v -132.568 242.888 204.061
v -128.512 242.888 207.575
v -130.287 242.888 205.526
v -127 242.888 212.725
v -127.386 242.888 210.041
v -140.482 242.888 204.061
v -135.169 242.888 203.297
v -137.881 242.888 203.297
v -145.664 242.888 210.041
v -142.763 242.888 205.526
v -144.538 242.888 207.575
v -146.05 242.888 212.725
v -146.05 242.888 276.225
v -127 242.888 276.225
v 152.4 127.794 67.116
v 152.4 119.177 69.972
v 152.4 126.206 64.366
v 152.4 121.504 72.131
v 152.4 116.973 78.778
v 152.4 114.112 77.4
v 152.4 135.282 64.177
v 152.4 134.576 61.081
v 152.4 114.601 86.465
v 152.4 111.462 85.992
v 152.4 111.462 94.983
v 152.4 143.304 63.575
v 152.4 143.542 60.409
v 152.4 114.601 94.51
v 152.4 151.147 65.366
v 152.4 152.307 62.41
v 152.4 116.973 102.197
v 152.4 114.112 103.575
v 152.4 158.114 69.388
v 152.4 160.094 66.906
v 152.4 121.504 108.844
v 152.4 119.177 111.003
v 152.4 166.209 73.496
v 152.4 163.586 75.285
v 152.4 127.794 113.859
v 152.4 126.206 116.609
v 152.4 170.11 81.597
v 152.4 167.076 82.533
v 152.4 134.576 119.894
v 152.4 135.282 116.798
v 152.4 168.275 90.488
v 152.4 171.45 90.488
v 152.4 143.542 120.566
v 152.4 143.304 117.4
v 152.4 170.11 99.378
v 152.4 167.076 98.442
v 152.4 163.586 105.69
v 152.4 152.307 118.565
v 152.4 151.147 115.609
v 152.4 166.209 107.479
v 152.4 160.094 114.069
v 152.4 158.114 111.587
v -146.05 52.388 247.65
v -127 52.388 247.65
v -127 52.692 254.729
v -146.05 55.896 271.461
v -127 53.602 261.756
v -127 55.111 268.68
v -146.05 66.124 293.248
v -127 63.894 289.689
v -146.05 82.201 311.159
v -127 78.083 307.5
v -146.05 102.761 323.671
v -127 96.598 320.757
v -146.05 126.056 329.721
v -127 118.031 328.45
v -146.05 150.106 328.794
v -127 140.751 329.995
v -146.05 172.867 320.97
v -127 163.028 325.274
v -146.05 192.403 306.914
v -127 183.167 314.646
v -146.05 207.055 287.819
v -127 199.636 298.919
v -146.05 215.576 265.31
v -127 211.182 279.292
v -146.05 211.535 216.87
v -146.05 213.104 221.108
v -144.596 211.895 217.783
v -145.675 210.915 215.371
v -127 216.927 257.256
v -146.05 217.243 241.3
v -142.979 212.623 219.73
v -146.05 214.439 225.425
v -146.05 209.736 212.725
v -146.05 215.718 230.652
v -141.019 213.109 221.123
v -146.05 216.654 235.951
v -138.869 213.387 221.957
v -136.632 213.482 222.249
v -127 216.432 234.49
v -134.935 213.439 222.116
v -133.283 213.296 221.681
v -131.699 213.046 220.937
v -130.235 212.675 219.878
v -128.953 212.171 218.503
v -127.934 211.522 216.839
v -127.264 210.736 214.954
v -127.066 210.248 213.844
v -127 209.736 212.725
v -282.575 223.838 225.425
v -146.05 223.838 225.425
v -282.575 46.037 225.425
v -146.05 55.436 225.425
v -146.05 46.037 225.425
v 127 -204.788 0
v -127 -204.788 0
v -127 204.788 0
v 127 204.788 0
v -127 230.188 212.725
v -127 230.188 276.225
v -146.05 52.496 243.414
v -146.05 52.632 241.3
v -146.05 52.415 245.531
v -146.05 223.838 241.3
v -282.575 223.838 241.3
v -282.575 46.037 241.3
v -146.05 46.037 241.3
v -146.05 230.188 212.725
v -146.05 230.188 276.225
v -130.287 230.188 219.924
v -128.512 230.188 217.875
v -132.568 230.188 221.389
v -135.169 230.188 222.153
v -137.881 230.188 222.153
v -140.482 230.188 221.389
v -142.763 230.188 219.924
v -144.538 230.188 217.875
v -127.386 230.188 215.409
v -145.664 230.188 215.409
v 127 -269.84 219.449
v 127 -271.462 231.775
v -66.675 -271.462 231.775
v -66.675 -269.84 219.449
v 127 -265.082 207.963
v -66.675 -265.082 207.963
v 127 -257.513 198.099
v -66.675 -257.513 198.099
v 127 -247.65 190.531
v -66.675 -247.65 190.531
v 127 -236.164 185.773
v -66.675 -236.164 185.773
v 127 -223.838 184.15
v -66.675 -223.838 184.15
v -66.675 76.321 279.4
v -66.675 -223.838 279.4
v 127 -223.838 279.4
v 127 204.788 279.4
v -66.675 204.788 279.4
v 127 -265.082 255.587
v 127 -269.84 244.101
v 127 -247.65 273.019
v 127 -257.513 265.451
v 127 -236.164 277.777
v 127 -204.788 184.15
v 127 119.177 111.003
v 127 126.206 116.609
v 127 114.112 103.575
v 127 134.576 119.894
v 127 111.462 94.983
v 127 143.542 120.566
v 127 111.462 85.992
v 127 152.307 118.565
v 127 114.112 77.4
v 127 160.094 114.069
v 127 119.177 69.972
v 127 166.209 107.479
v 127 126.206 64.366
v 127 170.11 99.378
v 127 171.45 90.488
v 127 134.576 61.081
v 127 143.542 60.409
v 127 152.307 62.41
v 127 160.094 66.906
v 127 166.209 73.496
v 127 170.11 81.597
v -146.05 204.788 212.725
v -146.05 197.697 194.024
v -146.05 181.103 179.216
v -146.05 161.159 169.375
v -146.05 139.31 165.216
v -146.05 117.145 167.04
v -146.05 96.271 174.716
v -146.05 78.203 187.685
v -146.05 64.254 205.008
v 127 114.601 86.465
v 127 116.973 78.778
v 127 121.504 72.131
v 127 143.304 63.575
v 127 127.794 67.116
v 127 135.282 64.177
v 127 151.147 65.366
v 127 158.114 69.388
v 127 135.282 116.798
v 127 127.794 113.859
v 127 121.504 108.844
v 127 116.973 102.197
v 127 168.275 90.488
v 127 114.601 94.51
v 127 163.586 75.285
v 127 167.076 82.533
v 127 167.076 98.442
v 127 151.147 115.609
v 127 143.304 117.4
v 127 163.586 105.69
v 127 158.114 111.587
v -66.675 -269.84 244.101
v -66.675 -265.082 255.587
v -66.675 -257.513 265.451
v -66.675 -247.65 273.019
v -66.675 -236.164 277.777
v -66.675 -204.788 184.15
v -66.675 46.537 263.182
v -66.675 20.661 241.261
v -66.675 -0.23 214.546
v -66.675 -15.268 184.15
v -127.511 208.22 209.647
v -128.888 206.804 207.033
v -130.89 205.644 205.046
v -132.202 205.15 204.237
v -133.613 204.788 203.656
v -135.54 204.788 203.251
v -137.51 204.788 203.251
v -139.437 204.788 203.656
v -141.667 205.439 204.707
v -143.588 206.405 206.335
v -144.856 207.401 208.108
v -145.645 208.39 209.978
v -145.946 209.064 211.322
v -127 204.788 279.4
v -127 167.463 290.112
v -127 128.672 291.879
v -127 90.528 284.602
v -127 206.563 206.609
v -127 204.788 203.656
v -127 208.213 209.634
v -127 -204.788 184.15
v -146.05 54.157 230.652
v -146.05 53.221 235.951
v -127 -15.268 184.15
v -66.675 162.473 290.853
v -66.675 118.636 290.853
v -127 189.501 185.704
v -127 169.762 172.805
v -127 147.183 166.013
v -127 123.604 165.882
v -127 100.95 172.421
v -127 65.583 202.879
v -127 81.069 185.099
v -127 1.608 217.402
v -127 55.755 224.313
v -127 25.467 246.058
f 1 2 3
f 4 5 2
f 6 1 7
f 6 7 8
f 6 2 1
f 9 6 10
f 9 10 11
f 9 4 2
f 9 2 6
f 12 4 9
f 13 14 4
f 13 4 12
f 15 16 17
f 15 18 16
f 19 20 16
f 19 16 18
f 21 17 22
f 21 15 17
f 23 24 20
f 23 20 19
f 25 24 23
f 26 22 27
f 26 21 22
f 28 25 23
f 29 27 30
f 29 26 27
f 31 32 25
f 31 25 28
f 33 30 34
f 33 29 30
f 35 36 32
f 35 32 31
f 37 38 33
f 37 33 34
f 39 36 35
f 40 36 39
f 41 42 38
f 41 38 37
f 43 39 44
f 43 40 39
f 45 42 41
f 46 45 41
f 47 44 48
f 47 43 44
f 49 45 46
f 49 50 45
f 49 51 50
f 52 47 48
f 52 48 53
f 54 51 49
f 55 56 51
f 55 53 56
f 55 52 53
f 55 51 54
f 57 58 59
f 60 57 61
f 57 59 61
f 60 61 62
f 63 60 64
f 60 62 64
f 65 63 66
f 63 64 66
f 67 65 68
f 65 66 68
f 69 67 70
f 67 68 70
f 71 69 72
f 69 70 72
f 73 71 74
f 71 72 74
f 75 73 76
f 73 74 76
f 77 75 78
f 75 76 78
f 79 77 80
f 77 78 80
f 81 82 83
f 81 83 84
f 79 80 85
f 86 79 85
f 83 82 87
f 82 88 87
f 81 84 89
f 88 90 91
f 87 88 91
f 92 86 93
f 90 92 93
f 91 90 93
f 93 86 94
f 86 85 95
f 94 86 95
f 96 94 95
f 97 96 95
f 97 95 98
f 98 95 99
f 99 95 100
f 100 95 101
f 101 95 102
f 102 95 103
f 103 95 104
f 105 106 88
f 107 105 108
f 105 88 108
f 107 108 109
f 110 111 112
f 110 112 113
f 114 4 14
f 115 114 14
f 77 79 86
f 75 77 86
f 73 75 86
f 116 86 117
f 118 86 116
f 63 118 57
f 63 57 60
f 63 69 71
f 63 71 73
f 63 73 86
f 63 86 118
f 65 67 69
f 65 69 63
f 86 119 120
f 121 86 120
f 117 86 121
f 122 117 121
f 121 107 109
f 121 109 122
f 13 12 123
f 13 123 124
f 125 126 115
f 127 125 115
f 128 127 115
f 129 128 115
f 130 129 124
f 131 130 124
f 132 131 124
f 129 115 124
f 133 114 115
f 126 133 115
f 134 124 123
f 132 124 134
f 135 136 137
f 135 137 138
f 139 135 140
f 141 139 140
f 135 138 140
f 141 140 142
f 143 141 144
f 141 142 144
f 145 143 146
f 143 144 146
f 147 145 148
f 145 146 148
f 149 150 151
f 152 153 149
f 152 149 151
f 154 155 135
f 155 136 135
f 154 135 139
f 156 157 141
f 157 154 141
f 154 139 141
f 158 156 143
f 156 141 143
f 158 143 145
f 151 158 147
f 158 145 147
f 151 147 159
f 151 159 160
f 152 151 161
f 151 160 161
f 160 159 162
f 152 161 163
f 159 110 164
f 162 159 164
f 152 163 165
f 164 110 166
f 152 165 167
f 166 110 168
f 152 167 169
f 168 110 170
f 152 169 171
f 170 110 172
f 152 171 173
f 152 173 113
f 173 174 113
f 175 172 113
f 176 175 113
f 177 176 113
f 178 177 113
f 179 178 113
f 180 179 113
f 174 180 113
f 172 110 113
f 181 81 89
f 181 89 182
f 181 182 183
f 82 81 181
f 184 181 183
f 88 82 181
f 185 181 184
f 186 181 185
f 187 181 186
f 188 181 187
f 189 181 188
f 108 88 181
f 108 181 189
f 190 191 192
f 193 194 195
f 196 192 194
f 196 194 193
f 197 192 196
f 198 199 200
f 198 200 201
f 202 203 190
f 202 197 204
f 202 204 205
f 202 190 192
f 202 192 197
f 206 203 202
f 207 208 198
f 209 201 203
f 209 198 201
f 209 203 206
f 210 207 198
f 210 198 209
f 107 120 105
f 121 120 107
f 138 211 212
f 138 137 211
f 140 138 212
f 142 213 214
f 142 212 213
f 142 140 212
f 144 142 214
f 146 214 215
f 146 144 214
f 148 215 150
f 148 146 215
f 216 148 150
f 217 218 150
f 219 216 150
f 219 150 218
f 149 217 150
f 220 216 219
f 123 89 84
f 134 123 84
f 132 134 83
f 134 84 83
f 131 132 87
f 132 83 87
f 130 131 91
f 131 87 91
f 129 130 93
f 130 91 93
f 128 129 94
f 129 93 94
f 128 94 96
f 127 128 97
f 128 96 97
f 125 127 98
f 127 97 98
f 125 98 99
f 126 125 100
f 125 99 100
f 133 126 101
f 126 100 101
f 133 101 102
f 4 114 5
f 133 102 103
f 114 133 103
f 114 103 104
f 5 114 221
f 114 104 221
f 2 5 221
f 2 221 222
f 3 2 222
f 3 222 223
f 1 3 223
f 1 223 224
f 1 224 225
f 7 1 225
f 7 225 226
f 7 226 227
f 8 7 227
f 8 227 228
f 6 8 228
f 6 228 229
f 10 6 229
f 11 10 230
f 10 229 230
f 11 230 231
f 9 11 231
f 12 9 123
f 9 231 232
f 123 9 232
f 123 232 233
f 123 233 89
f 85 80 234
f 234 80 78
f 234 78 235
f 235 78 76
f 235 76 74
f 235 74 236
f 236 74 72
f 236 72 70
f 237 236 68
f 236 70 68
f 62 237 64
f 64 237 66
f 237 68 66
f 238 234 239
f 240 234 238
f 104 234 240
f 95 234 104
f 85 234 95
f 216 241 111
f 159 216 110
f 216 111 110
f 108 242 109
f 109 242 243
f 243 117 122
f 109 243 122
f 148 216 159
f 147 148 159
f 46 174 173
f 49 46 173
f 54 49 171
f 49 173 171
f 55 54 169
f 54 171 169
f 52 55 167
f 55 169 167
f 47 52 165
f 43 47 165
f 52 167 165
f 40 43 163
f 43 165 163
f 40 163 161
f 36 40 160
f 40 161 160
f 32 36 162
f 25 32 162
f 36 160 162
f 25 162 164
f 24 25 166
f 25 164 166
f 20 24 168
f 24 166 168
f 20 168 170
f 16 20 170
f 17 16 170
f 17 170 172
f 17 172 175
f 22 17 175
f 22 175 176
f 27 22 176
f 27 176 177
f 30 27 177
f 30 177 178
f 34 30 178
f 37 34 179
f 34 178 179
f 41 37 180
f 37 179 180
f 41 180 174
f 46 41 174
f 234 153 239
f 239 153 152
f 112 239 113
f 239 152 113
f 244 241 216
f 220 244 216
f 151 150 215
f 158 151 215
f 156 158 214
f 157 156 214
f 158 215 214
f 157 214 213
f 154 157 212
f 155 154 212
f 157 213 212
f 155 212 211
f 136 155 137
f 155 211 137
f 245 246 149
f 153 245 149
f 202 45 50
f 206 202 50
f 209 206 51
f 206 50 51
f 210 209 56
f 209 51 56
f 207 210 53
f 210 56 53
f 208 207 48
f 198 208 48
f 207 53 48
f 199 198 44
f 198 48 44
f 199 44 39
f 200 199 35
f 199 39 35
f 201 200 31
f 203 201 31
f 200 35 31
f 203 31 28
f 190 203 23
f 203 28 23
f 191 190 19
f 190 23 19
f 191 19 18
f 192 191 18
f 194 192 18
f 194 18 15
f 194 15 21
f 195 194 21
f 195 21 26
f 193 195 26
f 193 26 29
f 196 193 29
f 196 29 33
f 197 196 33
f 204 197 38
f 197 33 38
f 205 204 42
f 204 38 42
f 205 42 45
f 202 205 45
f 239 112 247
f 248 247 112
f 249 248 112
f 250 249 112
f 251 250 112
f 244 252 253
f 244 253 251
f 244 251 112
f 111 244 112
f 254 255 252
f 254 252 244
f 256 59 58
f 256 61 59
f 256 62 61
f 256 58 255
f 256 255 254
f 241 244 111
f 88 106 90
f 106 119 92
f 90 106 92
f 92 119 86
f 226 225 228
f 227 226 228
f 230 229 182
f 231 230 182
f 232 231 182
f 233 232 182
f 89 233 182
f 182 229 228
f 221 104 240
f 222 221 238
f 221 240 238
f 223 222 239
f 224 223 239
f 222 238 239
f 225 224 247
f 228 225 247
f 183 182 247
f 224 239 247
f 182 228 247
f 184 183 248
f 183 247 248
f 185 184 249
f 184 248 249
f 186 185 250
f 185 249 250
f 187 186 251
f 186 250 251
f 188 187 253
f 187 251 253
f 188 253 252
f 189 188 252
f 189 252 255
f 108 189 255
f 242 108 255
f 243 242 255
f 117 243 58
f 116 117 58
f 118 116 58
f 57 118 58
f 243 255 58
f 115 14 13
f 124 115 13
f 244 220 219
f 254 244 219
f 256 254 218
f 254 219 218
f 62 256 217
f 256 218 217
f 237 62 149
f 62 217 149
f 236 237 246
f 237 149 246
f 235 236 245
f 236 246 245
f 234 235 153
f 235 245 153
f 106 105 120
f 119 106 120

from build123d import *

# Parameters (mm, degrees)
F0_W      = 254
F0_H      = 409.575
F1_DEPTH  = 184.15
F2_W      = 193.675
F2_H      = 476.25
F3_DEPTH  = 95.25
F5_R      = 30.1625
F6_DEPTH  = 25.4
F7_R      = 26.9875
F8_DEPTH  = 25.4
F9_R      = 82.55
F10_DEPTH = 19.05
F11_W     = 177.8
F11_H     = 15.875
F12_DEPTH = 136.525
F14_DEPTH = 60.325
F16_DEPTH = 193.675
F17_R     = 9.525
F18_DEPTH = 38.1
F19_W     = 19.05
F19_H     = 63.5
F20_DEPTH = 12.7


with BuildPart() as f1:
    # F0 (on Top) → F1 (new body)
    with BuildSketch(Plane.XY):
        Rectangle(F0_W, F0_H)
    extrude(amount=F1_DEPTH)

    # F2 (on face) → F3 (join)
    with BuildSketch(Plane.XY.offset(184.15)):
        with Locations((30.1625, -33.3375)):
            Rectangle(F2_W, F2_H)
    extrude(amount=F3_DEPTH)

    # F5 (on face) → F6 (join)
    with BuildSketch(Plane.YZ.offset(127)):
        with Locations((141.2875, 90.4875)):
            Circle(F5_R)
    extrude(amount=F6_DEPTH)

    # F7 (on face) → F8 (cut)
    with BuildSketch(Plane.YZ.offset(152.4)):
        with Locations((141.2875, 90.4875)):
            Circle(F7_R)
    extrude(amount=-F8_DEPTH, mode=Mode.SUBTRACT)

    # F9 (on face) → F10 (join)
    with BuildSketch(Plane(origin=(-127, 0, 0), x_dir=(0, -1, 0), z_dir=(-1, 0, 0))):
        with Locations((-134.9375, 247.65)):
            Circle(F9_R)
    extrude(amount=F10_DEPTH)

    # F11 (on face) → F12 (join)
    with BuildSketch(Plane(origin=(-146.05, 0, 0), x_dir=(0, -1, 0), z_dir=(-1, 0, 0))):
        with Locations((-134.9375, 233.3625)):
            Rectangle(F11_W, F11_H)
    extrude(amount=F12_DEPTH)

    # F13 (on face) → F14 (join, through all)
    with BuildSketch(Plane(origin=(-66.675, 0, 0), x_dir=(0, -1, 0), z_dir=(-1, 0, 0))):
        with BuildLine():
            Line((-204.7875, 279.4), (-204.7875, 184.15))
            Line((-204.7875, 184.15), (15.268247, 184.15))
            ThreePointArc((15.268247, 184.15), (-74.48391, 278.617919), (-204.7875, 279.4))
        make_face()
    extrude(amount=F14_DEPTH)

    # F15 (on face) → F16 (cut, through all)
    with BuildSketch(Plane(origin=(-66.675, 0, 0), x_dir=(0, -1, 0), z_dir=(-1, 0, 0))):
        with BuildLine():
            ThreePointArc((223.8375, 279.4), (257.51346, 265.45096), (271.4625, 231.775))
            Line((271.4625, 231.775), (271.4625, 279.4))
            Line((271.4625, 279.4), (223.8375, 279.4))
        make_face()
        with BuildLine():
            ThreePointArc((271.4625, 231.775), (257.51346, 198.09904), (223.8375, 184.15))
            Line((223.8375, 184.15), (271.4625, 184.15))
            Line((271.4625, 184.15), (271.4625, 231.775))
        make_face()
    extrude(amount=-F16_DEPTH, mode=Mode.SUBTRACT)

    # F17 (on face) → F18 (join)
    with BuildSketch(Plane(origin=(0, 204.7875, 0), x_dir=(-1, 0, 0), z_dir=(0, 1, 0))):
        with Locations((136.525, 212.725)):
            Circle(F17_R)
    extrude(amount=F18_DEPTH)

    # F19 (on face) → F20 (join)
    with BuildSketch(Plane(origin=(0, 242.8875, 0), x_dir=(-1, 0, 0), z_dir=(0, 1, 0))):
        with Locations((136.525, 244.475)):
            Rectangle(F19_W, F19_H)
    extrude(amount=-F20_DEPTH)


solid = f1.part
